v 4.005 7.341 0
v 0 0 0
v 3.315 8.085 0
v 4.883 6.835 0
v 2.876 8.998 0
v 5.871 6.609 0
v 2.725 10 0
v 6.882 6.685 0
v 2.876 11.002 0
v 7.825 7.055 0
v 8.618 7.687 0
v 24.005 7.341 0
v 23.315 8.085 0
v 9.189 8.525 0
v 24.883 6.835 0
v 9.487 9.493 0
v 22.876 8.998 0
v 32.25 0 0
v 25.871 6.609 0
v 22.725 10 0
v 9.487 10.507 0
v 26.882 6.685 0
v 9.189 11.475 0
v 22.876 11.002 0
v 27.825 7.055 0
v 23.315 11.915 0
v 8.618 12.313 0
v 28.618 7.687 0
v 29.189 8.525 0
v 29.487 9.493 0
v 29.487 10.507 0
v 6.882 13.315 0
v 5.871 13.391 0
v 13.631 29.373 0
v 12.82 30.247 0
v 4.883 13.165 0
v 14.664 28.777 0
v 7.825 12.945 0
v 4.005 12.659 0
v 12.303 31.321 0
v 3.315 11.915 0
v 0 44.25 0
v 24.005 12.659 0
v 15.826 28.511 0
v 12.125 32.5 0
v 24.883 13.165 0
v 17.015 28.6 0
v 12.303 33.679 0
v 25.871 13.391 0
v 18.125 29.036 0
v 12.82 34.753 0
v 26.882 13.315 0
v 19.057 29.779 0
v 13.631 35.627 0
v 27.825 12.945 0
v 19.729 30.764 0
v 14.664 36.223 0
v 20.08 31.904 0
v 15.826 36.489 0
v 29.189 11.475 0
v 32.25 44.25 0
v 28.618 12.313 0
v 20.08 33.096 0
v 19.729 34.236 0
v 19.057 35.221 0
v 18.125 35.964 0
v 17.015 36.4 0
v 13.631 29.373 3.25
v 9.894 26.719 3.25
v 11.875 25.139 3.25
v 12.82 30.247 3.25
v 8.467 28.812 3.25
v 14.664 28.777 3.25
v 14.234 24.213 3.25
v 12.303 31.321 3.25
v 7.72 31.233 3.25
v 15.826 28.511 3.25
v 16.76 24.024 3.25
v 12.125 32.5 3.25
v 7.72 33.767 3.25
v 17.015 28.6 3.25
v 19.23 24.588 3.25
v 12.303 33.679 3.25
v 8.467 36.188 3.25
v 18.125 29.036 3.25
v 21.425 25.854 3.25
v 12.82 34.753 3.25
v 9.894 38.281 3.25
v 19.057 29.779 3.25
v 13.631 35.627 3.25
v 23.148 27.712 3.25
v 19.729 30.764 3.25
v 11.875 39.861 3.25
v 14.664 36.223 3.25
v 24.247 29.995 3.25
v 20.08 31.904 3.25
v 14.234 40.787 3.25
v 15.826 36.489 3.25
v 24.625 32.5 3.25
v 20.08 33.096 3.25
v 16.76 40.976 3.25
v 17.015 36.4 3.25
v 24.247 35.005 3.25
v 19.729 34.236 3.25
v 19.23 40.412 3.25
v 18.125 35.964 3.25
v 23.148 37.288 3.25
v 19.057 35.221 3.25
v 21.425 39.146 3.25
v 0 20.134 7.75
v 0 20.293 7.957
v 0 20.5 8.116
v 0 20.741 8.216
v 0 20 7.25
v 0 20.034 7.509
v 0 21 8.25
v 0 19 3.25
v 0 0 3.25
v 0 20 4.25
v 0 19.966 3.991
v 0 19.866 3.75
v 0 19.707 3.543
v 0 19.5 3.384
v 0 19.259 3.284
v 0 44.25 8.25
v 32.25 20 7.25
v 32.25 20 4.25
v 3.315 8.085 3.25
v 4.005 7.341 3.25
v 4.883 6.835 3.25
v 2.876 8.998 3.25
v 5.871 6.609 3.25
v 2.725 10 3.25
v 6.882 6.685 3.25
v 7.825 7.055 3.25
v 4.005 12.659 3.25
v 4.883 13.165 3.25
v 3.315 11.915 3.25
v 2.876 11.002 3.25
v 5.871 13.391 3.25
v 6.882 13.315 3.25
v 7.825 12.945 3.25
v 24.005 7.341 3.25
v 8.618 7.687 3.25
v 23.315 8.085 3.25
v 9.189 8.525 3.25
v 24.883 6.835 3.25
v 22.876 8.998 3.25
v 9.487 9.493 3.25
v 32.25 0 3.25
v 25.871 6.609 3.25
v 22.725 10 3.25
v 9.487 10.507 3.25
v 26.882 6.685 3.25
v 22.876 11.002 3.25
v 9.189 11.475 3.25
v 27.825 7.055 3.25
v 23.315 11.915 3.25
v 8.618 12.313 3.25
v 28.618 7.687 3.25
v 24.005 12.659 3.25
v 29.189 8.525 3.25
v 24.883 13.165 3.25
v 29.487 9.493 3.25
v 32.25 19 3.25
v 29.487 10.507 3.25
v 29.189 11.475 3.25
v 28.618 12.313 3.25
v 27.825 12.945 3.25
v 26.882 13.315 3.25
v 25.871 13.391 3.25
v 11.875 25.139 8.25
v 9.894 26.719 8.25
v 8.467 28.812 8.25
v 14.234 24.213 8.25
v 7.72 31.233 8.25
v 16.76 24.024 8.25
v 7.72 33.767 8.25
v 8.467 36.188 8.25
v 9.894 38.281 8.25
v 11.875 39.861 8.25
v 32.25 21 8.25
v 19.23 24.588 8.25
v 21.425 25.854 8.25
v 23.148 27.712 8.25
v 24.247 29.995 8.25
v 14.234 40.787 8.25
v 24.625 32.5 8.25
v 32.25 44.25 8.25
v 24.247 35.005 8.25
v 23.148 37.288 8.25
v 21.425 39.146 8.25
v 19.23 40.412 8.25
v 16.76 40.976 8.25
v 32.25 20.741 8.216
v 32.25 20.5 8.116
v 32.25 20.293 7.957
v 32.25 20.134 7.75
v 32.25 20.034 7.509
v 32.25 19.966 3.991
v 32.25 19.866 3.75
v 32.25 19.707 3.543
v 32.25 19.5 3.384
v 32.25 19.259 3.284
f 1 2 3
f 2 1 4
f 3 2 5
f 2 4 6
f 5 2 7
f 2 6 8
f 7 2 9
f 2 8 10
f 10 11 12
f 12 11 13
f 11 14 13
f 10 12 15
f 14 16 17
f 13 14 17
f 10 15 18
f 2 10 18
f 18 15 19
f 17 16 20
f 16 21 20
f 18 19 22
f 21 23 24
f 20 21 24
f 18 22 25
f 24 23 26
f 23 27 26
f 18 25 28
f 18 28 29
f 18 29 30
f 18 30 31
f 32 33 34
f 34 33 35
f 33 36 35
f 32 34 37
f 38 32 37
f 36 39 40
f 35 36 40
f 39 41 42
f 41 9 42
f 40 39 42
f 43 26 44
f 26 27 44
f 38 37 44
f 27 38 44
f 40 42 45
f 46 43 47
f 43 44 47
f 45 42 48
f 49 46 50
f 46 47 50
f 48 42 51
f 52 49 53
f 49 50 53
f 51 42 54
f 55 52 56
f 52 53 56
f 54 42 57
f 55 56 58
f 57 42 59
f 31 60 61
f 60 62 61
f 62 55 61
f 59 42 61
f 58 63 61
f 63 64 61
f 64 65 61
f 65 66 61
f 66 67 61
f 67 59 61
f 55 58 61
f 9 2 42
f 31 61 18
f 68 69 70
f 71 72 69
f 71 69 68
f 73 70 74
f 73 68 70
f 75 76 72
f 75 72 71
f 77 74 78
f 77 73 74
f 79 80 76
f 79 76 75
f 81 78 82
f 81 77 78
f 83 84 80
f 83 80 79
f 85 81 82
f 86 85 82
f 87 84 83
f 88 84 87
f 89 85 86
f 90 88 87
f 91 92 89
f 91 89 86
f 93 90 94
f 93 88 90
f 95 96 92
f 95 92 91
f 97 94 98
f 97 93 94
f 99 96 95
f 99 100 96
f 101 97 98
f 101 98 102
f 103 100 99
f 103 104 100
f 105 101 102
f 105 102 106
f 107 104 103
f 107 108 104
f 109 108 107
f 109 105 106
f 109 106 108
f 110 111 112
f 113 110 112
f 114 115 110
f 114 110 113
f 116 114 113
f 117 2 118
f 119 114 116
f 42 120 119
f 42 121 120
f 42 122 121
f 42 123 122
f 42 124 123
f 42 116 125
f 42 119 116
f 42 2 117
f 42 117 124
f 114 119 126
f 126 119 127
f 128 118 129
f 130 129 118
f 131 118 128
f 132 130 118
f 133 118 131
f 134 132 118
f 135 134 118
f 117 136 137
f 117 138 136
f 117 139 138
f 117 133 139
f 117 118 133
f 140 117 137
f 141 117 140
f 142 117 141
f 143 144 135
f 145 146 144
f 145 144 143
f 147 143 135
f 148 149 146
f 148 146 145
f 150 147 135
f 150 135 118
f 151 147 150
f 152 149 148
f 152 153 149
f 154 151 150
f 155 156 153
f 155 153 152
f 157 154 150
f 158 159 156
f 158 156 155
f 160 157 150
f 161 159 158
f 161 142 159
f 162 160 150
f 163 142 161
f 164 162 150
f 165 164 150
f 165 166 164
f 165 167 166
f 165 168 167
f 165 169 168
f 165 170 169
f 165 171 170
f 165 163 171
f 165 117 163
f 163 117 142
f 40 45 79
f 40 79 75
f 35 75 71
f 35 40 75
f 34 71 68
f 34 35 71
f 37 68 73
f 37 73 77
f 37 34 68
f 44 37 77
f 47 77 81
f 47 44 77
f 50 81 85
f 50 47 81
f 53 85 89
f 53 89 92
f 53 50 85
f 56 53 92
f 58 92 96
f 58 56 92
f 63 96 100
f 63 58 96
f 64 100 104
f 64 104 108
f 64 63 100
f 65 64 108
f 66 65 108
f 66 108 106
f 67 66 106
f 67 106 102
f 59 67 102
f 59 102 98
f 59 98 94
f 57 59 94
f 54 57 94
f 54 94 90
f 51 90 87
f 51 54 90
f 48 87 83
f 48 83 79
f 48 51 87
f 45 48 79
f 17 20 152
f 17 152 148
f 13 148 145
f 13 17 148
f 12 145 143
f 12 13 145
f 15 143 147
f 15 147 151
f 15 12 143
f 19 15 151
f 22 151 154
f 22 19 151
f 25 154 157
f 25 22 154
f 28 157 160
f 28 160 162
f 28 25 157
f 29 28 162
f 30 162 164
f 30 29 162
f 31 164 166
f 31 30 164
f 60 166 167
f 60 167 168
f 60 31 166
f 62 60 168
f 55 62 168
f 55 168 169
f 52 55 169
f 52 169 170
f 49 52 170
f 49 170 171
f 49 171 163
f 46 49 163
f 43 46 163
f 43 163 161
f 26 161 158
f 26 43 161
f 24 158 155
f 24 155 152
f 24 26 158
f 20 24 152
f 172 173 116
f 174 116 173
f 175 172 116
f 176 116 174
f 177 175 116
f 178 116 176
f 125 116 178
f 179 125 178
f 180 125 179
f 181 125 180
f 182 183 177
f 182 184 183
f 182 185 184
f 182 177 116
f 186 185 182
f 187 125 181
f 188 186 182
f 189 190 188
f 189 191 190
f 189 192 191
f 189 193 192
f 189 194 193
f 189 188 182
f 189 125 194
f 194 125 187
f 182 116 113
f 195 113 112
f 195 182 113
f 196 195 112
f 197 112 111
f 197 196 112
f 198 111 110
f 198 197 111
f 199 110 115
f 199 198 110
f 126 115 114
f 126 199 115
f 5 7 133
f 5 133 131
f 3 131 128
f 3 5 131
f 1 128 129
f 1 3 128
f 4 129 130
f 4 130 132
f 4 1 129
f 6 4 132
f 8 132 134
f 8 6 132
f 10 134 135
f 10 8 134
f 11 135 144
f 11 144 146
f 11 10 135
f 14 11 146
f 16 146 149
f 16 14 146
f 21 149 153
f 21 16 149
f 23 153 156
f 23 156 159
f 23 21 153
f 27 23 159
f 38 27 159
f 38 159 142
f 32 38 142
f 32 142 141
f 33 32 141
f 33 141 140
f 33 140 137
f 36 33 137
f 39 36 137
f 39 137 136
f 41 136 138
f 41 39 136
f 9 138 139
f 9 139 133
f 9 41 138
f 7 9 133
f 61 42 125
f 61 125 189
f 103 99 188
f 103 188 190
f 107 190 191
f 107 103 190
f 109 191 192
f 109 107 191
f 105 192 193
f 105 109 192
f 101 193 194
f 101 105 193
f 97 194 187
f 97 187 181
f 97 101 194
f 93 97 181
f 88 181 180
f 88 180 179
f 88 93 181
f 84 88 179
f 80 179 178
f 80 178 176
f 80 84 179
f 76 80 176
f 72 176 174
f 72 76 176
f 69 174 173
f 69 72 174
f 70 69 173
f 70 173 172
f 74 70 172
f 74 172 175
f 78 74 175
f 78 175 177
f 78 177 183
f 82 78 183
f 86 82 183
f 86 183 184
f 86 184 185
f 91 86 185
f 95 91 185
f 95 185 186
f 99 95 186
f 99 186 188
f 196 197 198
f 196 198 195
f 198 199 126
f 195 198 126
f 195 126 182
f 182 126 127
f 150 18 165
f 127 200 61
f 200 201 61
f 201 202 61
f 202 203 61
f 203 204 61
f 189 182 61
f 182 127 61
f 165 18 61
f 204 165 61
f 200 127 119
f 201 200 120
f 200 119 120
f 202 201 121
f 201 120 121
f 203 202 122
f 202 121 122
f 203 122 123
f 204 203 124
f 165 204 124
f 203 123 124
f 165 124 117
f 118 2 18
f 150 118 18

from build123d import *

# Parameters (mm, degrees)
SKETCH1_W           = 32.25
SKETCH1_H           = 44.25
SKETCH1_R           = 3.400367627
SKETCH1_R_2         = 4
BOSS_EXTRUDE1_DEPTH = 3.25
SKETCH1_3_W         = 32.25
SKETCH1_3_H         = 24.25
SKETCH1_3_R         = 8.5
BOSS_EXTRUDE2_DEPTH = 8.25
FILLET1_R           = 1


with BuildPart() as part:
    # Sketch1 → Boss-Extrude1 (new body)
    with BuildSketch(Plane.XY):
        with Locations((16.125, 22.125)):
            Rectangle(SKETCH1_W, SKETCH1_H)
        with Locations((6.125, 10)):
            Circle(SKETCH1_R, mode=Mode.SUBTRACT)
        with Locations((26.125, 10)):
            Circle(SKETCH1_R, mode=Mode.SUBTRACT)
        with Locations((16.125, 32.5)):
            Circle(SKETCH1_R_2, mode=Mode.SUBTRACT)
    extrude(amount=BOSS_EXTRUDE1_DEPTH)

    # Sketch1<3> → Boss-Extrude2 (add)
    with BuildSketch(Plane.XY):
        with Locations((16.125, 32.125)):
            Rectangle(SKETCH1_3_W, SKETCH1_3_H)
        with Locations((16.125, 32.5)):
            Circle(SKETCH1_3_R, mode=Mode.SUBTRACT)
    extrude(amount=BOSS_EXTRUDE2_DEPTH)

    # Fillet1
    fillet1_edges = [part.edges().sort_by_distance(p)[0] for p in [
        (16.125, 20, 8.25),
        (16.125, 20, 3.25),
    ]]
    fillet(fillet1_edges, radius=FILLET1_R)


solid = part.part
